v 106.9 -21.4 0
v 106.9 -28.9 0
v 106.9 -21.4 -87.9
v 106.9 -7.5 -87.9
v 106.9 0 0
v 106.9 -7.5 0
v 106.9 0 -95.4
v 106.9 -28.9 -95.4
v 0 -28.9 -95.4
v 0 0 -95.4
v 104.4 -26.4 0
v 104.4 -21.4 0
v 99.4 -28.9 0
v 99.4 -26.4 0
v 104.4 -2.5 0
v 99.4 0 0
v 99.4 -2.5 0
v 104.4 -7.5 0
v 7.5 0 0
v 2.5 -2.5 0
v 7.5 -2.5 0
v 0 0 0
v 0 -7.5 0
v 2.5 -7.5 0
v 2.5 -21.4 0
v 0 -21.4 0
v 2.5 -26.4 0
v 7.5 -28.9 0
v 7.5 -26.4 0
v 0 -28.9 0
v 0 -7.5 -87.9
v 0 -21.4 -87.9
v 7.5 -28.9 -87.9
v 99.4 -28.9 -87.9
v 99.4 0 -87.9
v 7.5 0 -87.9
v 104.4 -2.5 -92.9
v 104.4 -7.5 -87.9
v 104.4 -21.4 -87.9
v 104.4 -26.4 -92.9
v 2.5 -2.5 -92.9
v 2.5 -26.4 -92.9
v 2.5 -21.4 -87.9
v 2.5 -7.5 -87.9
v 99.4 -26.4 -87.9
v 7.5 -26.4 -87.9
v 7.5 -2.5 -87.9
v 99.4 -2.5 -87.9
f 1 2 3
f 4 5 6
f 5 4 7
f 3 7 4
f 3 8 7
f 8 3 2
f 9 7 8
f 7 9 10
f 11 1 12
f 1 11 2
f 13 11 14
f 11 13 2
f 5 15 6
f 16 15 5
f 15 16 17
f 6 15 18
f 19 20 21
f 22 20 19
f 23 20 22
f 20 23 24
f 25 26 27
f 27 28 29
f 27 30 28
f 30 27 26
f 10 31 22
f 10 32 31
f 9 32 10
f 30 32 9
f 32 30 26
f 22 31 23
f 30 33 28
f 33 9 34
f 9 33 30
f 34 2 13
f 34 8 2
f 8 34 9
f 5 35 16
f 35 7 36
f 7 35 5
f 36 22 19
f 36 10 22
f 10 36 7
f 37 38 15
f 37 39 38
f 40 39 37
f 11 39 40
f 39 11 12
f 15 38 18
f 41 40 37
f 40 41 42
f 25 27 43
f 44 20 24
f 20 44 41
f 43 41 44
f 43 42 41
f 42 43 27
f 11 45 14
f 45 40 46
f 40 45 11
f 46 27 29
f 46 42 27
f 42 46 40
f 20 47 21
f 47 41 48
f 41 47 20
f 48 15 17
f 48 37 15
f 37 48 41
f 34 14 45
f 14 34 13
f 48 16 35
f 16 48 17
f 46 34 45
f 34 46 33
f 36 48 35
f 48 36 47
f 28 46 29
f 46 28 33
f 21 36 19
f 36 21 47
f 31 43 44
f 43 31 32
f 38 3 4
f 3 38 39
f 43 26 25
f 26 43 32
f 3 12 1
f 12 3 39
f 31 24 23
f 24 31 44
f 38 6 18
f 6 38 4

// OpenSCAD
wall = 2.5;
lip = 5;

block_d = [101.5, 23.5, 92.5] + 0.4*[1, 1, 1];


rotate([180,0,0])
difference() {
  cube(block_d+wall*[2,2,1]);
  translate(wall*[1,1,0]+[0,0,0]) cube(block_d+[0,0,0]);
  translate((wall+lip)*[1,0,0]) cube(block_d+[-2*lip,2*wall,-lip]);
  translate((wall+lip)*[0,1,0]) cube(block_d+[2*wall,-2*lip,-lip]);
};
